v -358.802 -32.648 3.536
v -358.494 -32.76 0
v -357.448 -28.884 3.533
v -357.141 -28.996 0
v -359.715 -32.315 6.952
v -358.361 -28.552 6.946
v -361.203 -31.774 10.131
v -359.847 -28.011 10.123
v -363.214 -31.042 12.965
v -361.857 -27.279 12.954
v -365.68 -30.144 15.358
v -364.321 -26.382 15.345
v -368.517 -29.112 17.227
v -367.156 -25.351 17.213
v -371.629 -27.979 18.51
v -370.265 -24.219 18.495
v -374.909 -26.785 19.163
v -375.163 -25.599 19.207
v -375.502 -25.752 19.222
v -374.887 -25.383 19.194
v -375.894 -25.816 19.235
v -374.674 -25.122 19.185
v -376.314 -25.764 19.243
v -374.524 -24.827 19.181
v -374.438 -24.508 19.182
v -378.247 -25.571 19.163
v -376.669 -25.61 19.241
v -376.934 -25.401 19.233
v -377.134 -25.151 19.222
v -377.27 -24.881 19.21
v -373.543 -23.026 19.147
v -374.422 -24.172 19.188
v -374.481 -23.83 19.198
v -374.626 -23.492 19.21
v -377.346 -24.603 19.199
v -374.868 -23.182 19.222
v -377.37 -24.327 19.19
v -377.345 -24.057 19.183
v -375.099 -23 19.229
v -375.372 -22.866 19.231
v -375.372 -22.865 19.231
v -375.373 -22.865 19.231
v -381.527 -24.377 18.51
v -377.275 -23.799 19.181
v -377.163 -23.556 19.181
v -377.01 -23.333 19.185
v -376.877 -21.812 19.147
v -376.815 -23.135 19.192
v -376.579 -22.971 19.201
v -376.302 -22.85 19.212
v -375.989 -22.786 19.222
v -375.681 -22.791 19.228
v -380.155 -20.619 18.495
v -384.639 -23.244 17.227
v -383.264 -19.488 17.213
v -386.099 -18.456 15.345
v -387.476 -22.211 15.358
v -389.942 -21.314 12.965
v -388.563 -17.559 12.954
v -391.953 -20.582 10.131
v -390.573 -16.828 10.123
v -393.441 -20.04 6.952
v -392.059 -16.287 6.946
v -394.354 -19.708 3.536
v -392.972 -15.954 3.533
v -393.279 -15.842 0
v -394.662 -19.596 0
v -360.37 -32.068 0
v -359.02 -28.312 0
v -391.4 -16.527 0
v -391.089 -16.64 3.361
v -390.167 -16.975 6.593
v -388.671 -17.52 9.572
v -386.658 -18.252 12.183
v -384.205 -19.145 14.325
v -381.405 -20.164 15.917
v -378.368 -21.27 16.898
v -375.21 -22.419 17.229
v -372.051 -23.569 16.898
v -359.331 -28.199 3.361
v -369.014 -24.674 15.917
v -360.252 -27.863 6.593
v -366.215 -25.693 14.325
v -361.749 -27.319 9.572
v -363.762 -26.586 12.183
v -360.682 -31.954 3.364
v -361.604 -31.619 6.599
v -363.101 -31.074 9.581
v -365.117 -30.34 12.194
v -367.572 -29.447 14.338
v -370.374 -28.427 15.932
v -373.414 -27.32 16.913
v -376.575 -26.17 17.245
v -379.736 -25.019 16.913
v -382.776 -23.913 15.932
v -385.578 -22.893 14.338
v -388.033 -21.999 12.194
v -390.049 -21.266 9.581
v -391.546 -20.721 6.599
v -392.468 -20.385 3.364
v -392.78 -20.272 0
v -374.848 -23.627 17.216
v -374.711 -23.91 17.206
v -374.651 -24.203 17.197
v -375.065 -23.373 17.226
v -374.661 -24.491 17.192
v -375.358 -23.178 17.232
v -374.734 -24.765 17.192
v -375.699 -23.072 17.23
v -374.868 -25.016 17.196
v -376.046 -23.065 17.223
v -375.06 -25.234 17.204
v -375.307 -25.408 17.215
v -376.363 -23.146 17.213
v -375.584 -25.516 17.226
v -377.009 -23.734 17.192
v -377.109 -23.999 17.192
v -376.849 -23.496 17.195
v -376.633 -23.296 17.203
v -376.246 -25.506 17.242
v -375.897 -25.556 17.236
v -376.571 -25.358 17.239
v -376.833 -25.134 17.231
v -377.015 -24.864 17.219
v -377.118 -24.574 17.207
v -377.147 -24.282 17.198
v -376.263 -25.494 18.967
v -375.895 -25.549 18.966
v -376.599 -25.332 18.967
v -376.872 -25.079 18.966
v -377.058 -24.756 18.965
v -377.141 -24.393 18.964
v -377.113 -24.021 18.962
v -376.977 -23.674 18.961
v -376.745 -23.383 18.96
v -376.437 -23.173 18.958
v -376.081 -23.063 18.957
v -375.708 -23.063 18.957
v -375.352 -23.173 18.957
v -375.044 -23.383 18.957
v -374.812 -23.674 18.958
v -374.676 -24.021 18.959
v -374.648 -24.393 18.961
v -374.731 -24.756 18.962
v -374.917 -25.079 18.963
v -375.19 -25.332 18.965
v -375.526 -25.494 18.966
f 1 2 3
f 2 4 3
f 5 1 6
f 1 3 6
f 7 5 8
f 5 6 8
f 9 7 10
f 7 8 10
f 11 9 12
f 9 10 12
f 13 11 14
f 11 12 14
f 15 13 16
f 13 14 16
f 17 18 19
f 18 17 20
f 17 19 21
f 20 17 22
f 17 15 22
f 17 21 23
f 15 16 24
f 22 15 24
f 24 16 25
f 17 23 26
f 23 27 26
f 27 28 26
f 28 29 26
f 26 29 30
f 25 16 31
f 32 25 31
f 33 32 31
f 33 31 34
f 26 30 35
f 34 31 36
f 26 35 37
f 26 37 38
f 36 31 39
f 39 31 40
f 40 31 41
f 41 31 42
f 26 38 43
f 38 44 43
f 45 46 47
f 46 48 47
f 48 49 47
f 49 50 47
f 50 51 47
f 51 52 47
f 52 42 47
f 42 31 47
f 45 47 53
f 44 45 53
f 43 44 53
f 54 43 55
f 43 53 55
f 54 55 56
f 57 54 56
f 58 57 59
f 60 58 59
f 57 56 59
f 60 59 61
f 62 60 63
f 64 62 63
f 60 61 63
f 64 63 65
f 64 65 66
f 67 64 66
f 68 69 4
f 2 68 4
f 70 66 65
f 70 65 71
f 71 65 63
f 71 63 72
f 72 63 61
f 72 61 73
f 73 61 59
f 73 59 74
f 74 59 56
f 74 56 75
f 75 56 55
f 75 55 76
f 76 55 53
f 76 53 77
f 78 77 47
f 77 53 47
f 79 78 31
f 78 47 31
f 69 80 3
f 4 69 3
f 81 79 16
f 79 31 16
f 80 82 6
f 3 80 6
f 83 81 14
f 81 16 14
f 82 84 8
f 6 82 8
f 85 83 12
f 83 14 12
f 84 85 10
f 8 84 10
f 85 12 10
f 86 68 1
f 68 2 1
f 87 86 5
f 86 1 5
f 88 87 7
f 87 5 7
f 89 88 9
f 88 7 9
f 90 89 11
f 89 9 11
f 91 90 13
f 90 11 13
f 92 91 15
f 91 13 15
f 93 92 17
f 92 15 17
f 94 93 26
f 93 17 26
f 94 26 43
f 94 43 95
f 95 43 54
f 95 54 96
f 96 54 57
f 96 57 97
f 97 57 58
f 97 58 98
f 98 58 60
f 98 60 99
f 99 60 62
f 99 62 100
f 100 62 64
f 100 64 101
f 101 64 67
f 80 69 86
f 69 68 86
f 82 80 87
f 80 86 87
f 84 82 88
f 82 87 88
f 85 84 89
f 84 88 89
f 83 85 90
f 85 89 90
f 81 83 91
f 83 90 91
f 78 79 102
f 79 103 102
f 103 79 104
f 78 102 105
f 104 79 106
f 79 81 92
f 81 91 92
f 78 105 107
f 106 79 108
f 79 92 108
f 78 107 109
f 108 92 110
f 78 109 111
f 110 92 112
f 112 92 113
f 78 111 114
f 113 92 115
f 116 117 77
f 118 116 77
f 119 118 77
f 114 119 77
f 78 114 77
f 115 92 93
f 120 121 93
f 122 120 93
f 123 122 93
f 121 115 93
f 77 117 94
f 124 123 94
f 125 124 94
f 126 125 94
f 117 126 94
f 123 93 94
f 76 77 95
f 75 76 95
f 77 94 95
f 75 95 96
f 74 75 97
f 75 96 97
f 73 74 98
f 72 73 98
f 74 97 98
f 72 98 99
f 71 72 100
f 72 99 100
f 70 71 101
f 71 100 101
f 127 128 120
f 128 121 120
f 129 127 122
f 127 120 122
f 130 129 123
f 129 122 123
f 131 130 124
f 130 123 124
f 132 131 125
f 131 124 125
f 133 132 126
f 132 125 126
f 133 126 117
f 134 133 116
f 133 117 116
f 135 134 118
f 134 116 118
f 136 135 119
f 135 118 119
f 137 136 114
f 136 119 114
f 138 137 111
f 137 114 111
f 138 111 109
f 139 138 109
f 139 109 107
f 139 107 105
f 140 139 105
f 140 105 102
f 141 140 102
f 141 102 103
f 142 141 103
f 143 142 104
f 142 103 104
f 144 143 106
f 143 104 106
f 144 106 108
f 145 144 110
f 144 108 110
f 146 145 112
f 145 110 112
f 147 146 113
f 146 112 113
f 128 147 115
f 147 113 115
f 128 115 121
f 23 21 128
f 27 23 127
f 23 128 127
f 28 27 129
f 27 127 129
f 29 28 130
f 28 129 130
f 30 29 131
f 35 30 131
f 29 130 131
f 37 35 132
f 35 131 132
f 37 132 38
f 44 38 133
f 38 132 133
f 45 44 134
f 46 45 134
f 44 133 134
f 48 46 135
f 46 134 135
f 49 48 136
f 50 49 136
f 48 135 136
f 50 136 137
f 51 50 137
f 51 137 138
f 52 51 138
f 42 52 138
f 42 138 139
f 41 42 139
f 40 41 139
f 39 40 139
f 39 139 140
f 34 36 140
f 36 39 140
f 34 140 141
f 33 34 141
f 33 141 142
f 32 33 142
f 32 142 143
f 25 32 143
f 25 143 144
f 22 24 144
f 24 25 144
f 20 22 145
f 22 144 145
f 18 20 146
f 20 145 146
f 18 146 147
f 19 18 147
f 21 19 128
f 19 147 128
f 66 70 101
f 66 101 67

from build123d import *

# Parameters (mm, degrees)
ROTOVAT1_ANGLE        = 180
M3_Z_VIT1_D           = 2.5
M3_Z_VIT1_DEPTH       = 19.288970198
M3_Z_VIT1_CSINK_D     = 3.05
M3_Z_VIT1_CSINK_ANGLE = 90


with BuildPart() as part:
    # Skica1 → Rotovat1 (revolve)
    with BuildSketch(Plane.XY):
        Polygon((-358.493859674, -32.75993206), (-357.140613979, -28.995817934), (-359.020013823, -28.311772333), (-360.370342902, -32.067773761), align=None)
    revolve(axis=Axis((-372.880596884, -16.019433279, 0), (-0.342020143, -0.939692621, 0)), revolution_arc=ROTOVAT1_ANGLE)

    # M3 závit1
    with Locations(Plane(origin=(-375.894265461, -24.29837465, 19.236814653), x_dir=(0, 0.999993116, -0.003710613), z_dir=(0.00133078, 0.00371061, 0.99999223))):
        with Locations((0, 0)):
            CounterSinkHole(M3_Z_VIT1_D / 2, M3_Z_VIT1_CSINK_D / 2, depth=M3_Z_VIT1_DEPTH, counter_sink_angle=M3_Z_VIT1_CSINK_ANGLE)


solid = part.part
